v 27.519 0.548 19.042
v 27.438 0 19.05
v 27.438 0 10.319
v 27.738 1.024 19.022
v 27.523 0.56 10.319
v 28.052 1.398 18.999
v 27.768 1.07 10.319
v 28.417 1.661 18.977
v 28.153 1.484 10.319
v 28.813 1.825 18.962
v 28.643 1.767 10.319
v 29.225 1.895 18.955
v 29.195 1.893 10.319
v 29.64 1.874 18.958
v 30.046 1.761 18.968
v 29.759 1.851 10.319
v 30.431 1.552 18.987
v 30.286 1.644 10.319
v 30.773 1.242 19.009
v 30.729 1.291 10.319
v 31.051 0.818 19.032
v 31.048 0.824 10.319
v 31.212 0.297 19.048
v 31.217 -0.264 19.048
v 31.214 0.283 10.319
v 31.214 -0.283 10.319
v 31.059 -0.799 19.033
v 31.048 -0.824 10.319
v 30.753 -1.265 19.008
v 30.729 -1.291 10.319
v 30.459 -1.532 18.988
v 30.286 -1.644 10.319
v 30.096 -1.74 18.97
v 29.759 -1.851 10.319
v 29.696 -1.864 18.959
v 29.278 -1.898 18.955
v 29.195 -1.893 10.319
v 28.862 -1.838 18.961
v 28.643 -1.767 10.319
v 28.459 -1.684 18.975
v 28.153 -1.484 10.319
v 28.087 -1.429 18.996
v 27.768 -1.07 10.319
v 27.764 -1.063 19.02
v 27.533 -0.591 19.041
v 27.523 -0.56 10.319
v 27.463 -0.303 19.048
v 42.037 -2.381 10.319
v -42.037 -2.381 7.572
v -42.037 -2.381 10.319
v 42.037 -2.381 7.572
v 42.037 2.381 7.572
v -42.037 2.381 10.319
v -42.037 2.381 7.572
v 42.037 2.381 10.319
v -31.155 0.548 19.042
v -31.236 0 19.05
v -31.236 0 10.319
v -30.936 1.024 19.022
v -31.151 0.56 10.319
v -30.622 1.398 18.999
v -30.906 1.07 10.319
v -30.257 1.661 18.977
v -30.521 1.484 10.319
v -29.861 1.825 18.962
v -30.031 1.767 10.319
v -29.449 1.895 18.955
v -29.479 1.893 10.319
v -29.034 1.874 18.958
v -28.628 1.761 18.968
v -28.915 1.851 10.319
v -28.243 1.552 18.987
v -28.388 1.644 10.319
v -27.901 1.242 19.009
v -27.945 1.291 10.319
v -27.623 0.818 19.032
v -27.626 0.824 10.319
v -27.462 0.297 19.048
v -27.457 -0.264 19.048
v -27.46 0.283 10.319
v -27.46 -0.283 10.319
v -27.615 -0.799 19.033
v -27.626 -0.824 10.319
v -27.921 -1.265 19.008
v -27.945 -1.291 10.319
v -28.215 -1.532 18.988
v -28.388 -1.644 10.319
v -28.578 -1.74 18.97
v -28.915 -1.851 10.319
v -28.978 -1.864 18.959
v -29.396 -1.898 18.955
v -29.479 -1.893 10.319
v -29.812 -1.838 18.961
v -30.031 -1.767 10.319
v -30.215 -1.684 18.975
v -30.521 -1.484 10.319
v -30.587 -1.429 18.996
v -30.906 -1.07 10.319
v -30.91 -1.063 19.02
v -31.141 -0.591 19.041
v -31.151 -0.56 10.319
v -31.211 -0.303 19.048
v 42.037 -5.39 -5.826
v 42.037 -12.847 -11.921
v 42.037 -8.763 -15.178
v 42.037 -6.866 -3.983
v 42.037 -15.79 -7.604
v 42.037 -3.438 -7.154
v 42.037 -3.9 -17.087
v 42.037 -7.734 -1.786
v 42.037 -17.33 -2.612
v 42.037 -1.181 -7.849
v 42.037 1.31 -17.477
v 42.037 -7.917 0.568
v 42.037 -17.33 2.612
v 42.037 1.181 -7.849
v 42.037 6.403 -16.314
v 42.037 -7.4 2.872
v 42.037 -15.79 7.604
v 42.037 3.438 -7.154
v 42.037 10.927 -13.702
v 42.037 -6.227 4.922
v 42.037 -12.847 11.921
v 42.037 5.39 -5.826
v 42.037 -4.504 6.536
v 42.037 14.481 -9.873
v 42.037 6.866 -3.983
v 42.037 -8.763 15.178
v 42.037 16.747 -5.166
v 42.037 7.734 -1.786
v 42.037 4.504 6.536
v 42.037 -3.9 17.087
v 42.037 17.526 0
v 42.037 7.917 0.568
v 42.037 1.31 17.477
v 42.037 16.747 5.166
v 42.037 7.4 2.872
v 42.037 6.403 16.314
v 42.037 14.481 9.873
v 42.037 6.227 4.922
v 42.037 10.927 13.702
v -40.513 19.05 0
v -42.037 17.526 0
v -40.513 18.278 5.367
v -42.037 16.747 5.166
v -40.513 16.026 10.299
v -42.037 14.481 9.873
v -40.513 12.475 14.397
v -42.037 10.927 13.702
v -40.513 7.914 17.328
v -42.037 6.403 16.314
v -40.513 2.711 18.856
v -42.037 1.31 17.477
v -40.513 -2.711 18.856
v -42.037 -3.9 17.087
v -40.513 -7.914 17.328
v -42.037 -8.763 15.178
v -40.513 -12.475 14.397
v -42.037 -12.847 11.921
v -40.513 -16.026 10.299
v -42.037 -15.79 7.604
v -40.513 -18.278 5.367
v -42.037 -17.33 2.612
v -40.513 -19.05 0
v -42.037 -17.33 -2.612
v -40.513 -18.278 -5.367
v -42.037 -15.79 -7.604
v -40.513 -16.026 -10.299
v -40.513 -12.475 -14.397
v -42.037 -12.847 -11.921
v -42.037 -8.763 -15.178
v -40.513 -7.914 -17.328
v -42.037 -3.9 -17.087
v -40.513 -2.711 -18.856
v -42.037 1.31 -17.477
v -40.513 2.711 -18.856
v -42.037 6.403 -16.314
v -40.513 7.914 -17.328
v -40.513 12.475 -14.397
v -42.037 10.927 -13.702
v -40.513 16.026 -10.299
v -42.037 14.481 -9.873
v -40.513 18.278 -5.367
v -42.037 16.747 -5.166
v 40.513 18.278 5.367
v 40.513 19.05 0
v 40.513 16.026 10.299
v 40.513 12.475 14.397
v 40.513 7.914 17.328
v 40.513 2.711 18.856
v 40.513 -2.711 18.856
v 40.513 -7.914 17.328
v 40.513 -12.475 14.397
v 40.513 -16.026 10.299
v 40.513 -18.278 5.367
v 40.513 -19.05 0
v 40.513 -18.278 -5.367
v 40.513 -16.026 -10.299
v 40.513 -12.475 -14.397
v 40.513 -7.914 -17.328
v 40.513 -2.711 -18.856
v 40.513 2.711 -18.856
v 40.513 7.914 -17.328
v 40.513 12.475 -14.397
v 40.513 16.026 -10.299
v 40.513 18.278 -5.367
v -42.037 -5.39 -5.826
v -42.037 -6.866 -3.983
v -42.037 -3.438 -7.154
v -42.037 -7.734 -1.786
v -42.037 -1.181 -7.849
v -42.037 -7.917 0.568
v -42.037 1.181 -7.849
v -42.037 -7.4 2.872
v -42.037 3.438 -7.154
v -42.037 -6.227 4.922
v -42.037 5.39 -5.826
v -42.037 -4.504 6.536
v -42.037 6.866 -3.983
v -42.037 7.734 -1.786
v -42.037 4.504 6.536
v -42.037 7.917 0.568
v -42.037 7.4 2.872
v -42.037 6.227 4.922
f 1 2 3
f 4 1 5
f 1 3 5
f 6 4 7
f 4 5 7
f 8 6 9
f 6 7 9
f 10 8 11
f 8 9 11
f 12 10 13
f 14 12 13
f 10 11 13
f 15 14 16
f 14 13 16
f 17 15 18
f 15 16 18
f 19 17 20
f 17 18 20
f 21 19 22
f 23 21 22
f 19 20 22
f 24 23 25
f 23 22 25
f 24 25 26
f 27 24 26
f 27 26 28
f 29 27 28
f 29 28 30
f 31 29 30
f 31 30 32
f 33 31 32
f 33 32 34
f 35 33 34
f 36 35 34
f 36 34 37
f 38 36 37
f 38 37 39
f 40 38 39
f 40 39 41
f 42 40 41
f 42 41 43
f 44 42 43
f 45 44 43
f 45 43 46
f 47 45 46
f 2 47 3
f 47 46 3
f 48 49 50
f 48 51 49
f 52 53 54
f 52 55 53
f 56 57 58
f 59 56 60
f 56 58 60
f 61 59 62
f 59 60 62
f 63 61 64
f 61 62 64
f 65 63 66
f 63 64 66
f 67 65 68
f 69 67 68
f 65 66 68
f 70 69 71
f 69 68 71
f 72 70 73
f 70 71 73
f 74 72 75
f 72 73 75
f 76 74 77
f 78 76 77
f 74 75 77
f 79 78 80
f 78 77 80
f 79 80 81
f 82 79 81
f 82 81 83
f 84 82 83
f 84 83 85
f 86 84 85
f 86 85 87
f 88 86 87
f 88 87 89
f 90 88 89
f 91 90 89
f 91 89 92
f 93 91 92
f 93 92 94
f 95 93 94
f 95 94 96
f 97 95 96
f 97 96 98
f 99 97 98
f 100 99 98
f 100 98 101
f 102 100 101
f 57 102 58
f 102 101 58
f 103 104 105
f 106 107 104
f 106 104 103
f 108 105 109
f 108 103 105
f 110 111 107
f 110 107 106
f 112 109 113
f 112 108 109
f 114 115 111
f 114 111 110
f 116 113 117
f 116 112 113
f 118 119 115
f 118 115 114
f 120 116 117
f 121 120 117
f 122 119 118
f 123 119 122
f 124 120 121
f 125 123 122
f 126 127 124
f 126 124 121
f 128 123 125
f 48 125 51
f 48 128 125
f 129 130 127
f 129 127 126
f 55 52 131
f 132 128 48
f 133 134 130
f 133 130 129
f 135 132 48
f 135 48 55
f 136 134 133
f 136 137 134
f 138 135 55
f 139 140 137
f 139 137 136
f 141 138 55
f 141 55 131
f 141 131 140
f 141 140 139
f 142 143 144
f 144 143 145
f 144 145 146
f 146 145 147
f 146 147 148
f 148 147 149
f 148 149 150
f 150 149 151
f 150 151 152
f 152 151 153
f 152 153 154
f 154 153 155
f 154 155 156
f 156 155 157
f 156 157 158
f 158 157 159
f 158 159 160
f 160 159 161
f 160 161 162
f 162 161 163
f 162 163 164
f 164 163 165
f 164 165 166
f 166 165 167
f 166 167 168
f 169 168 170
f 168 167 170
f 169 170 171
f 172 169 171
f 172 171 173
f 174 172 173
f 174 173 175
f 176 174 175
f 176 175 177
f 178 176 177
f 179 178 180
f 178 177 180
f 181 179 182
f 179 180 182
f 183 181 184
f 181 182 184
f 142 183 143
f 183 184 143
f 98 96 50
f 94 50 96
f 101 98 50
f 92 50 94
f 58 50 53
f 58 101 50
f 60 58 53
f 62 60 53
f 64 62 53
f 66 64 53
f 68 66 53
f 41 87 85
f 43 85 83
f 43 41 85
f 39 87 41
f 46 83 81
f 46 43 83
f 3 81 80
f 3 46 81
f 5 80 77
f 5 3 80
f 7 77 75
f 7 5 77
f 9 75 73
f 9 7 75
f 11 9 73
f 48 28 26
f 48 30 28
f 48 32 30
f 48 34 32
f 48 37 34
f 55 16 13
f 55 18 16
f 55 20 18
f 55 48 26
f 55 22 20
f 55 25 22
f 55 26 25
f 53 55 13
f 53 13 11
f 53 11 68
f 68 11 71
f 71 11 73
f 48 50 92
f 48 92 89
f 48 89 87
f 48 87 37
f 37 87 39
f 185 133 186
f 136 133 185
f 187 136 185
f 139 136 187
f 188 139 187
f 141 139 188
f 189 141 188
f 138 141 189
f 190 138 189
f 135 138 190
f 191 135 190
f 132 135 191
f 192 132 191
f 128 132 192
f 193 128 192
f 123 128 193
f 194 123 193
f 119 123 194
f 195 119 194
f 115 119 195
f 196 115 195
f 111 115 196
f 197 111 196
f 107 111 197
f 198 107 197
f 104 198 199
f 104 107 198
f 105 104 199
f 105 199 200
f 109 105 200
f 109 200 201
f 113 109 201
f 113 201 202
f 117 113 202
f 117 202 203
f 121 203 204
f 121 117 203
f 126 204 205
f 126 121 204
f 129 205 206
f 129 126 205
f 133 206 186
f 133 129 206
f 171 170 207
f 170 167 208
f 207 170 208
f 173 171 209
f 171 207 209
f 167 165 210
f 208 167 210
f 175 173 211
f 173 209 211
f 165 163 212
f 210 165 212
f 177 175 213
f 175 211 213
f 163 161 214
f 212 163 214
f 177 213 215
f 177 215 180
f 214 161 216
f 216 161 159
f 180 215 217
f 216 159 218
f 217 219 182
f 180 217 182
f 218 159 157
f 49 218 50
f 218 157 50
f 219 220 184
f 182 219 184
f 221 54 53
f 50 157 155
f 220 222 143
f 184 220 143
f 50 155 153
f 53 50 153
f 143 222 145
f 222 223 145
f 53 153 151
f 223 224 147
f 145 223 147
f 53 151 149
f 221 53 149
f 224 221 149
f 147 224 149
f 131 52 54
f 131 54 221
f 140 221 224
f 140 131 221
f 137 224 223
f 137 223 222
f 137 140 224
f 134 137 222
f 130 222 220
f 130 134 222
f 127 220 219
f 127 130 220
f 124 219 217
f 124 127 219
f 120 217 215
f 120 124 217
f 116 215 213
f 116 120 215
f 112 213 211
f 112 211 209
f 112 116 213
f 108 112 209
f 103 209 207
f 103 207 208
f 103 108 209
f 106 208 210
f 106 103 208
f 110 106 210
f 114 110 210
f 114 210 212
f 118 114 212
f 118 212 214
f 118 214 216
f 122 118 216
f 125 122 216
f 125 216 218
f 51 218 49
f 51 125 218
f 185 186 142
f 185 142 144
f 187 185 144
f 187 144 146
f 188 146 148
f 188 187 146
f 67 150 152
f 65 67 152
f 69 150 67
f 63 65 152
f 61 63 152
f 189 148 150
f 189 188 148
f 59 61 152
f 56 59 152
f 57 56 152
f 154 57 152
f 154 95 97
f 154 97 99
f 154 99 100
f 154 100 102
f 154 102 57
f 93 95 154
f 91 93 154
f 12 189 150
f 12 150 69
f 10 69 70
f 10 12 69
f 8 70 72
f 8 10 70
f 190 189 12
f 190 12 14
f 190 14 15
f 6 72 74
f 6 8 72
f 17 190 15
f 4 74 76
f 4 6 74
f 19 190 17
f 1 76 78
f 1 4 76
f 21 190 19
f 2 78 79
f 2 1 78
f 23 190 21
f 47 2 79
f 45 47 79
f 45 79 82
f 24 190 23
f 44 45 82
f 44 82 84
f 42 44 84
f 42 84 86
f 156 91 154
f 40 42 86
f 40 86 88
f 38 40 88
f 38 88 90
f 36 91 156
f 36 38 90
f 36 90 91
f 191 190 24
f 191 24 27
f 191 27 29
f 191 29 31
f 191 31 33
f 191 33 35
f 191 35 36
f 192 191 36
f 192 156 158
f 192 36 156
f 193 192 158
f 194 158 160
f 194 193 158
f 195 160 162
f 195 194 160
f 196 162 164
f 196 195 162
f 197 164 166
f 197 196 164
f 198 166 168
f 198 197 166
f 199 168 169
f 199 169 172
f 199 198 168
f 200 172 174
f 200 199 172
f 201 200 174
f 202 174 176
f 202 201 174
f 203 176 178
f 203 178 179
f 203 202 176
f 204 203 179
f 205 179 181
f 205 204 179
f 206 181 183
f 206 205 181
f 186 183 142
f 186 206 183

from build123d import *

# Parameters (mm, degrees)
F0_R     = 19.05
F1_DEPTH = 42.037
F4_D     = 3.7973
F4_DEPTH = 12
F4_START = 0.0948523
F4_TIP   = 1.1408240143
F5_SIZE  = 1.524


with BuildPart() as f1:
    # F0 (on Right) → F1 (new body, symmetric)
    with BuildSketch(Plane.YZ):
        Circle(F0_R)
        with BuildLine():
            ThreePointArc((2.38125, 7.5718924112), (0, -7.9375), (-2.38125, 7.5718924112))
            Line((-2.38125, 7.5718924112), (-2.38125, 10.31875))
            Line((-2.38125, 10.31875), (2.38125, 10.31875))
            Line((2.38125, 10.31875), (2.38125, 7.5718924112))
        make_face(mode=Mode.SUBTRACT)
    extrude(amount=F1_DEPTH, both=True)

    # F4
    # its depths count from where the whole tool has entered the part; down to there all is cleared
    with Locations(Plane.XY.offset(19.05).offset(-F4_START)):
        with Locations((29.337, 0), (-29.337, 0)):
            Hole(F4_D / 2, depth=F4_DEPTH)
            with Locations((0, 0, -(F4_DEPTH + F4_TIP / 2))):  # 118° drill point
                Cone(0, F4_D / 2, F4_TIP, mode=Mode.SUBTRACT)

    # F5
    f5_edges = [f1.edges().sort_by_distance(p)[0] for p in [
        (42.037, -19.05, 0),
        (-42.037, -19.05, 0),
    ]]
    chamfer(f5_edges, length=F5_SIZE)


solid = f1.part
